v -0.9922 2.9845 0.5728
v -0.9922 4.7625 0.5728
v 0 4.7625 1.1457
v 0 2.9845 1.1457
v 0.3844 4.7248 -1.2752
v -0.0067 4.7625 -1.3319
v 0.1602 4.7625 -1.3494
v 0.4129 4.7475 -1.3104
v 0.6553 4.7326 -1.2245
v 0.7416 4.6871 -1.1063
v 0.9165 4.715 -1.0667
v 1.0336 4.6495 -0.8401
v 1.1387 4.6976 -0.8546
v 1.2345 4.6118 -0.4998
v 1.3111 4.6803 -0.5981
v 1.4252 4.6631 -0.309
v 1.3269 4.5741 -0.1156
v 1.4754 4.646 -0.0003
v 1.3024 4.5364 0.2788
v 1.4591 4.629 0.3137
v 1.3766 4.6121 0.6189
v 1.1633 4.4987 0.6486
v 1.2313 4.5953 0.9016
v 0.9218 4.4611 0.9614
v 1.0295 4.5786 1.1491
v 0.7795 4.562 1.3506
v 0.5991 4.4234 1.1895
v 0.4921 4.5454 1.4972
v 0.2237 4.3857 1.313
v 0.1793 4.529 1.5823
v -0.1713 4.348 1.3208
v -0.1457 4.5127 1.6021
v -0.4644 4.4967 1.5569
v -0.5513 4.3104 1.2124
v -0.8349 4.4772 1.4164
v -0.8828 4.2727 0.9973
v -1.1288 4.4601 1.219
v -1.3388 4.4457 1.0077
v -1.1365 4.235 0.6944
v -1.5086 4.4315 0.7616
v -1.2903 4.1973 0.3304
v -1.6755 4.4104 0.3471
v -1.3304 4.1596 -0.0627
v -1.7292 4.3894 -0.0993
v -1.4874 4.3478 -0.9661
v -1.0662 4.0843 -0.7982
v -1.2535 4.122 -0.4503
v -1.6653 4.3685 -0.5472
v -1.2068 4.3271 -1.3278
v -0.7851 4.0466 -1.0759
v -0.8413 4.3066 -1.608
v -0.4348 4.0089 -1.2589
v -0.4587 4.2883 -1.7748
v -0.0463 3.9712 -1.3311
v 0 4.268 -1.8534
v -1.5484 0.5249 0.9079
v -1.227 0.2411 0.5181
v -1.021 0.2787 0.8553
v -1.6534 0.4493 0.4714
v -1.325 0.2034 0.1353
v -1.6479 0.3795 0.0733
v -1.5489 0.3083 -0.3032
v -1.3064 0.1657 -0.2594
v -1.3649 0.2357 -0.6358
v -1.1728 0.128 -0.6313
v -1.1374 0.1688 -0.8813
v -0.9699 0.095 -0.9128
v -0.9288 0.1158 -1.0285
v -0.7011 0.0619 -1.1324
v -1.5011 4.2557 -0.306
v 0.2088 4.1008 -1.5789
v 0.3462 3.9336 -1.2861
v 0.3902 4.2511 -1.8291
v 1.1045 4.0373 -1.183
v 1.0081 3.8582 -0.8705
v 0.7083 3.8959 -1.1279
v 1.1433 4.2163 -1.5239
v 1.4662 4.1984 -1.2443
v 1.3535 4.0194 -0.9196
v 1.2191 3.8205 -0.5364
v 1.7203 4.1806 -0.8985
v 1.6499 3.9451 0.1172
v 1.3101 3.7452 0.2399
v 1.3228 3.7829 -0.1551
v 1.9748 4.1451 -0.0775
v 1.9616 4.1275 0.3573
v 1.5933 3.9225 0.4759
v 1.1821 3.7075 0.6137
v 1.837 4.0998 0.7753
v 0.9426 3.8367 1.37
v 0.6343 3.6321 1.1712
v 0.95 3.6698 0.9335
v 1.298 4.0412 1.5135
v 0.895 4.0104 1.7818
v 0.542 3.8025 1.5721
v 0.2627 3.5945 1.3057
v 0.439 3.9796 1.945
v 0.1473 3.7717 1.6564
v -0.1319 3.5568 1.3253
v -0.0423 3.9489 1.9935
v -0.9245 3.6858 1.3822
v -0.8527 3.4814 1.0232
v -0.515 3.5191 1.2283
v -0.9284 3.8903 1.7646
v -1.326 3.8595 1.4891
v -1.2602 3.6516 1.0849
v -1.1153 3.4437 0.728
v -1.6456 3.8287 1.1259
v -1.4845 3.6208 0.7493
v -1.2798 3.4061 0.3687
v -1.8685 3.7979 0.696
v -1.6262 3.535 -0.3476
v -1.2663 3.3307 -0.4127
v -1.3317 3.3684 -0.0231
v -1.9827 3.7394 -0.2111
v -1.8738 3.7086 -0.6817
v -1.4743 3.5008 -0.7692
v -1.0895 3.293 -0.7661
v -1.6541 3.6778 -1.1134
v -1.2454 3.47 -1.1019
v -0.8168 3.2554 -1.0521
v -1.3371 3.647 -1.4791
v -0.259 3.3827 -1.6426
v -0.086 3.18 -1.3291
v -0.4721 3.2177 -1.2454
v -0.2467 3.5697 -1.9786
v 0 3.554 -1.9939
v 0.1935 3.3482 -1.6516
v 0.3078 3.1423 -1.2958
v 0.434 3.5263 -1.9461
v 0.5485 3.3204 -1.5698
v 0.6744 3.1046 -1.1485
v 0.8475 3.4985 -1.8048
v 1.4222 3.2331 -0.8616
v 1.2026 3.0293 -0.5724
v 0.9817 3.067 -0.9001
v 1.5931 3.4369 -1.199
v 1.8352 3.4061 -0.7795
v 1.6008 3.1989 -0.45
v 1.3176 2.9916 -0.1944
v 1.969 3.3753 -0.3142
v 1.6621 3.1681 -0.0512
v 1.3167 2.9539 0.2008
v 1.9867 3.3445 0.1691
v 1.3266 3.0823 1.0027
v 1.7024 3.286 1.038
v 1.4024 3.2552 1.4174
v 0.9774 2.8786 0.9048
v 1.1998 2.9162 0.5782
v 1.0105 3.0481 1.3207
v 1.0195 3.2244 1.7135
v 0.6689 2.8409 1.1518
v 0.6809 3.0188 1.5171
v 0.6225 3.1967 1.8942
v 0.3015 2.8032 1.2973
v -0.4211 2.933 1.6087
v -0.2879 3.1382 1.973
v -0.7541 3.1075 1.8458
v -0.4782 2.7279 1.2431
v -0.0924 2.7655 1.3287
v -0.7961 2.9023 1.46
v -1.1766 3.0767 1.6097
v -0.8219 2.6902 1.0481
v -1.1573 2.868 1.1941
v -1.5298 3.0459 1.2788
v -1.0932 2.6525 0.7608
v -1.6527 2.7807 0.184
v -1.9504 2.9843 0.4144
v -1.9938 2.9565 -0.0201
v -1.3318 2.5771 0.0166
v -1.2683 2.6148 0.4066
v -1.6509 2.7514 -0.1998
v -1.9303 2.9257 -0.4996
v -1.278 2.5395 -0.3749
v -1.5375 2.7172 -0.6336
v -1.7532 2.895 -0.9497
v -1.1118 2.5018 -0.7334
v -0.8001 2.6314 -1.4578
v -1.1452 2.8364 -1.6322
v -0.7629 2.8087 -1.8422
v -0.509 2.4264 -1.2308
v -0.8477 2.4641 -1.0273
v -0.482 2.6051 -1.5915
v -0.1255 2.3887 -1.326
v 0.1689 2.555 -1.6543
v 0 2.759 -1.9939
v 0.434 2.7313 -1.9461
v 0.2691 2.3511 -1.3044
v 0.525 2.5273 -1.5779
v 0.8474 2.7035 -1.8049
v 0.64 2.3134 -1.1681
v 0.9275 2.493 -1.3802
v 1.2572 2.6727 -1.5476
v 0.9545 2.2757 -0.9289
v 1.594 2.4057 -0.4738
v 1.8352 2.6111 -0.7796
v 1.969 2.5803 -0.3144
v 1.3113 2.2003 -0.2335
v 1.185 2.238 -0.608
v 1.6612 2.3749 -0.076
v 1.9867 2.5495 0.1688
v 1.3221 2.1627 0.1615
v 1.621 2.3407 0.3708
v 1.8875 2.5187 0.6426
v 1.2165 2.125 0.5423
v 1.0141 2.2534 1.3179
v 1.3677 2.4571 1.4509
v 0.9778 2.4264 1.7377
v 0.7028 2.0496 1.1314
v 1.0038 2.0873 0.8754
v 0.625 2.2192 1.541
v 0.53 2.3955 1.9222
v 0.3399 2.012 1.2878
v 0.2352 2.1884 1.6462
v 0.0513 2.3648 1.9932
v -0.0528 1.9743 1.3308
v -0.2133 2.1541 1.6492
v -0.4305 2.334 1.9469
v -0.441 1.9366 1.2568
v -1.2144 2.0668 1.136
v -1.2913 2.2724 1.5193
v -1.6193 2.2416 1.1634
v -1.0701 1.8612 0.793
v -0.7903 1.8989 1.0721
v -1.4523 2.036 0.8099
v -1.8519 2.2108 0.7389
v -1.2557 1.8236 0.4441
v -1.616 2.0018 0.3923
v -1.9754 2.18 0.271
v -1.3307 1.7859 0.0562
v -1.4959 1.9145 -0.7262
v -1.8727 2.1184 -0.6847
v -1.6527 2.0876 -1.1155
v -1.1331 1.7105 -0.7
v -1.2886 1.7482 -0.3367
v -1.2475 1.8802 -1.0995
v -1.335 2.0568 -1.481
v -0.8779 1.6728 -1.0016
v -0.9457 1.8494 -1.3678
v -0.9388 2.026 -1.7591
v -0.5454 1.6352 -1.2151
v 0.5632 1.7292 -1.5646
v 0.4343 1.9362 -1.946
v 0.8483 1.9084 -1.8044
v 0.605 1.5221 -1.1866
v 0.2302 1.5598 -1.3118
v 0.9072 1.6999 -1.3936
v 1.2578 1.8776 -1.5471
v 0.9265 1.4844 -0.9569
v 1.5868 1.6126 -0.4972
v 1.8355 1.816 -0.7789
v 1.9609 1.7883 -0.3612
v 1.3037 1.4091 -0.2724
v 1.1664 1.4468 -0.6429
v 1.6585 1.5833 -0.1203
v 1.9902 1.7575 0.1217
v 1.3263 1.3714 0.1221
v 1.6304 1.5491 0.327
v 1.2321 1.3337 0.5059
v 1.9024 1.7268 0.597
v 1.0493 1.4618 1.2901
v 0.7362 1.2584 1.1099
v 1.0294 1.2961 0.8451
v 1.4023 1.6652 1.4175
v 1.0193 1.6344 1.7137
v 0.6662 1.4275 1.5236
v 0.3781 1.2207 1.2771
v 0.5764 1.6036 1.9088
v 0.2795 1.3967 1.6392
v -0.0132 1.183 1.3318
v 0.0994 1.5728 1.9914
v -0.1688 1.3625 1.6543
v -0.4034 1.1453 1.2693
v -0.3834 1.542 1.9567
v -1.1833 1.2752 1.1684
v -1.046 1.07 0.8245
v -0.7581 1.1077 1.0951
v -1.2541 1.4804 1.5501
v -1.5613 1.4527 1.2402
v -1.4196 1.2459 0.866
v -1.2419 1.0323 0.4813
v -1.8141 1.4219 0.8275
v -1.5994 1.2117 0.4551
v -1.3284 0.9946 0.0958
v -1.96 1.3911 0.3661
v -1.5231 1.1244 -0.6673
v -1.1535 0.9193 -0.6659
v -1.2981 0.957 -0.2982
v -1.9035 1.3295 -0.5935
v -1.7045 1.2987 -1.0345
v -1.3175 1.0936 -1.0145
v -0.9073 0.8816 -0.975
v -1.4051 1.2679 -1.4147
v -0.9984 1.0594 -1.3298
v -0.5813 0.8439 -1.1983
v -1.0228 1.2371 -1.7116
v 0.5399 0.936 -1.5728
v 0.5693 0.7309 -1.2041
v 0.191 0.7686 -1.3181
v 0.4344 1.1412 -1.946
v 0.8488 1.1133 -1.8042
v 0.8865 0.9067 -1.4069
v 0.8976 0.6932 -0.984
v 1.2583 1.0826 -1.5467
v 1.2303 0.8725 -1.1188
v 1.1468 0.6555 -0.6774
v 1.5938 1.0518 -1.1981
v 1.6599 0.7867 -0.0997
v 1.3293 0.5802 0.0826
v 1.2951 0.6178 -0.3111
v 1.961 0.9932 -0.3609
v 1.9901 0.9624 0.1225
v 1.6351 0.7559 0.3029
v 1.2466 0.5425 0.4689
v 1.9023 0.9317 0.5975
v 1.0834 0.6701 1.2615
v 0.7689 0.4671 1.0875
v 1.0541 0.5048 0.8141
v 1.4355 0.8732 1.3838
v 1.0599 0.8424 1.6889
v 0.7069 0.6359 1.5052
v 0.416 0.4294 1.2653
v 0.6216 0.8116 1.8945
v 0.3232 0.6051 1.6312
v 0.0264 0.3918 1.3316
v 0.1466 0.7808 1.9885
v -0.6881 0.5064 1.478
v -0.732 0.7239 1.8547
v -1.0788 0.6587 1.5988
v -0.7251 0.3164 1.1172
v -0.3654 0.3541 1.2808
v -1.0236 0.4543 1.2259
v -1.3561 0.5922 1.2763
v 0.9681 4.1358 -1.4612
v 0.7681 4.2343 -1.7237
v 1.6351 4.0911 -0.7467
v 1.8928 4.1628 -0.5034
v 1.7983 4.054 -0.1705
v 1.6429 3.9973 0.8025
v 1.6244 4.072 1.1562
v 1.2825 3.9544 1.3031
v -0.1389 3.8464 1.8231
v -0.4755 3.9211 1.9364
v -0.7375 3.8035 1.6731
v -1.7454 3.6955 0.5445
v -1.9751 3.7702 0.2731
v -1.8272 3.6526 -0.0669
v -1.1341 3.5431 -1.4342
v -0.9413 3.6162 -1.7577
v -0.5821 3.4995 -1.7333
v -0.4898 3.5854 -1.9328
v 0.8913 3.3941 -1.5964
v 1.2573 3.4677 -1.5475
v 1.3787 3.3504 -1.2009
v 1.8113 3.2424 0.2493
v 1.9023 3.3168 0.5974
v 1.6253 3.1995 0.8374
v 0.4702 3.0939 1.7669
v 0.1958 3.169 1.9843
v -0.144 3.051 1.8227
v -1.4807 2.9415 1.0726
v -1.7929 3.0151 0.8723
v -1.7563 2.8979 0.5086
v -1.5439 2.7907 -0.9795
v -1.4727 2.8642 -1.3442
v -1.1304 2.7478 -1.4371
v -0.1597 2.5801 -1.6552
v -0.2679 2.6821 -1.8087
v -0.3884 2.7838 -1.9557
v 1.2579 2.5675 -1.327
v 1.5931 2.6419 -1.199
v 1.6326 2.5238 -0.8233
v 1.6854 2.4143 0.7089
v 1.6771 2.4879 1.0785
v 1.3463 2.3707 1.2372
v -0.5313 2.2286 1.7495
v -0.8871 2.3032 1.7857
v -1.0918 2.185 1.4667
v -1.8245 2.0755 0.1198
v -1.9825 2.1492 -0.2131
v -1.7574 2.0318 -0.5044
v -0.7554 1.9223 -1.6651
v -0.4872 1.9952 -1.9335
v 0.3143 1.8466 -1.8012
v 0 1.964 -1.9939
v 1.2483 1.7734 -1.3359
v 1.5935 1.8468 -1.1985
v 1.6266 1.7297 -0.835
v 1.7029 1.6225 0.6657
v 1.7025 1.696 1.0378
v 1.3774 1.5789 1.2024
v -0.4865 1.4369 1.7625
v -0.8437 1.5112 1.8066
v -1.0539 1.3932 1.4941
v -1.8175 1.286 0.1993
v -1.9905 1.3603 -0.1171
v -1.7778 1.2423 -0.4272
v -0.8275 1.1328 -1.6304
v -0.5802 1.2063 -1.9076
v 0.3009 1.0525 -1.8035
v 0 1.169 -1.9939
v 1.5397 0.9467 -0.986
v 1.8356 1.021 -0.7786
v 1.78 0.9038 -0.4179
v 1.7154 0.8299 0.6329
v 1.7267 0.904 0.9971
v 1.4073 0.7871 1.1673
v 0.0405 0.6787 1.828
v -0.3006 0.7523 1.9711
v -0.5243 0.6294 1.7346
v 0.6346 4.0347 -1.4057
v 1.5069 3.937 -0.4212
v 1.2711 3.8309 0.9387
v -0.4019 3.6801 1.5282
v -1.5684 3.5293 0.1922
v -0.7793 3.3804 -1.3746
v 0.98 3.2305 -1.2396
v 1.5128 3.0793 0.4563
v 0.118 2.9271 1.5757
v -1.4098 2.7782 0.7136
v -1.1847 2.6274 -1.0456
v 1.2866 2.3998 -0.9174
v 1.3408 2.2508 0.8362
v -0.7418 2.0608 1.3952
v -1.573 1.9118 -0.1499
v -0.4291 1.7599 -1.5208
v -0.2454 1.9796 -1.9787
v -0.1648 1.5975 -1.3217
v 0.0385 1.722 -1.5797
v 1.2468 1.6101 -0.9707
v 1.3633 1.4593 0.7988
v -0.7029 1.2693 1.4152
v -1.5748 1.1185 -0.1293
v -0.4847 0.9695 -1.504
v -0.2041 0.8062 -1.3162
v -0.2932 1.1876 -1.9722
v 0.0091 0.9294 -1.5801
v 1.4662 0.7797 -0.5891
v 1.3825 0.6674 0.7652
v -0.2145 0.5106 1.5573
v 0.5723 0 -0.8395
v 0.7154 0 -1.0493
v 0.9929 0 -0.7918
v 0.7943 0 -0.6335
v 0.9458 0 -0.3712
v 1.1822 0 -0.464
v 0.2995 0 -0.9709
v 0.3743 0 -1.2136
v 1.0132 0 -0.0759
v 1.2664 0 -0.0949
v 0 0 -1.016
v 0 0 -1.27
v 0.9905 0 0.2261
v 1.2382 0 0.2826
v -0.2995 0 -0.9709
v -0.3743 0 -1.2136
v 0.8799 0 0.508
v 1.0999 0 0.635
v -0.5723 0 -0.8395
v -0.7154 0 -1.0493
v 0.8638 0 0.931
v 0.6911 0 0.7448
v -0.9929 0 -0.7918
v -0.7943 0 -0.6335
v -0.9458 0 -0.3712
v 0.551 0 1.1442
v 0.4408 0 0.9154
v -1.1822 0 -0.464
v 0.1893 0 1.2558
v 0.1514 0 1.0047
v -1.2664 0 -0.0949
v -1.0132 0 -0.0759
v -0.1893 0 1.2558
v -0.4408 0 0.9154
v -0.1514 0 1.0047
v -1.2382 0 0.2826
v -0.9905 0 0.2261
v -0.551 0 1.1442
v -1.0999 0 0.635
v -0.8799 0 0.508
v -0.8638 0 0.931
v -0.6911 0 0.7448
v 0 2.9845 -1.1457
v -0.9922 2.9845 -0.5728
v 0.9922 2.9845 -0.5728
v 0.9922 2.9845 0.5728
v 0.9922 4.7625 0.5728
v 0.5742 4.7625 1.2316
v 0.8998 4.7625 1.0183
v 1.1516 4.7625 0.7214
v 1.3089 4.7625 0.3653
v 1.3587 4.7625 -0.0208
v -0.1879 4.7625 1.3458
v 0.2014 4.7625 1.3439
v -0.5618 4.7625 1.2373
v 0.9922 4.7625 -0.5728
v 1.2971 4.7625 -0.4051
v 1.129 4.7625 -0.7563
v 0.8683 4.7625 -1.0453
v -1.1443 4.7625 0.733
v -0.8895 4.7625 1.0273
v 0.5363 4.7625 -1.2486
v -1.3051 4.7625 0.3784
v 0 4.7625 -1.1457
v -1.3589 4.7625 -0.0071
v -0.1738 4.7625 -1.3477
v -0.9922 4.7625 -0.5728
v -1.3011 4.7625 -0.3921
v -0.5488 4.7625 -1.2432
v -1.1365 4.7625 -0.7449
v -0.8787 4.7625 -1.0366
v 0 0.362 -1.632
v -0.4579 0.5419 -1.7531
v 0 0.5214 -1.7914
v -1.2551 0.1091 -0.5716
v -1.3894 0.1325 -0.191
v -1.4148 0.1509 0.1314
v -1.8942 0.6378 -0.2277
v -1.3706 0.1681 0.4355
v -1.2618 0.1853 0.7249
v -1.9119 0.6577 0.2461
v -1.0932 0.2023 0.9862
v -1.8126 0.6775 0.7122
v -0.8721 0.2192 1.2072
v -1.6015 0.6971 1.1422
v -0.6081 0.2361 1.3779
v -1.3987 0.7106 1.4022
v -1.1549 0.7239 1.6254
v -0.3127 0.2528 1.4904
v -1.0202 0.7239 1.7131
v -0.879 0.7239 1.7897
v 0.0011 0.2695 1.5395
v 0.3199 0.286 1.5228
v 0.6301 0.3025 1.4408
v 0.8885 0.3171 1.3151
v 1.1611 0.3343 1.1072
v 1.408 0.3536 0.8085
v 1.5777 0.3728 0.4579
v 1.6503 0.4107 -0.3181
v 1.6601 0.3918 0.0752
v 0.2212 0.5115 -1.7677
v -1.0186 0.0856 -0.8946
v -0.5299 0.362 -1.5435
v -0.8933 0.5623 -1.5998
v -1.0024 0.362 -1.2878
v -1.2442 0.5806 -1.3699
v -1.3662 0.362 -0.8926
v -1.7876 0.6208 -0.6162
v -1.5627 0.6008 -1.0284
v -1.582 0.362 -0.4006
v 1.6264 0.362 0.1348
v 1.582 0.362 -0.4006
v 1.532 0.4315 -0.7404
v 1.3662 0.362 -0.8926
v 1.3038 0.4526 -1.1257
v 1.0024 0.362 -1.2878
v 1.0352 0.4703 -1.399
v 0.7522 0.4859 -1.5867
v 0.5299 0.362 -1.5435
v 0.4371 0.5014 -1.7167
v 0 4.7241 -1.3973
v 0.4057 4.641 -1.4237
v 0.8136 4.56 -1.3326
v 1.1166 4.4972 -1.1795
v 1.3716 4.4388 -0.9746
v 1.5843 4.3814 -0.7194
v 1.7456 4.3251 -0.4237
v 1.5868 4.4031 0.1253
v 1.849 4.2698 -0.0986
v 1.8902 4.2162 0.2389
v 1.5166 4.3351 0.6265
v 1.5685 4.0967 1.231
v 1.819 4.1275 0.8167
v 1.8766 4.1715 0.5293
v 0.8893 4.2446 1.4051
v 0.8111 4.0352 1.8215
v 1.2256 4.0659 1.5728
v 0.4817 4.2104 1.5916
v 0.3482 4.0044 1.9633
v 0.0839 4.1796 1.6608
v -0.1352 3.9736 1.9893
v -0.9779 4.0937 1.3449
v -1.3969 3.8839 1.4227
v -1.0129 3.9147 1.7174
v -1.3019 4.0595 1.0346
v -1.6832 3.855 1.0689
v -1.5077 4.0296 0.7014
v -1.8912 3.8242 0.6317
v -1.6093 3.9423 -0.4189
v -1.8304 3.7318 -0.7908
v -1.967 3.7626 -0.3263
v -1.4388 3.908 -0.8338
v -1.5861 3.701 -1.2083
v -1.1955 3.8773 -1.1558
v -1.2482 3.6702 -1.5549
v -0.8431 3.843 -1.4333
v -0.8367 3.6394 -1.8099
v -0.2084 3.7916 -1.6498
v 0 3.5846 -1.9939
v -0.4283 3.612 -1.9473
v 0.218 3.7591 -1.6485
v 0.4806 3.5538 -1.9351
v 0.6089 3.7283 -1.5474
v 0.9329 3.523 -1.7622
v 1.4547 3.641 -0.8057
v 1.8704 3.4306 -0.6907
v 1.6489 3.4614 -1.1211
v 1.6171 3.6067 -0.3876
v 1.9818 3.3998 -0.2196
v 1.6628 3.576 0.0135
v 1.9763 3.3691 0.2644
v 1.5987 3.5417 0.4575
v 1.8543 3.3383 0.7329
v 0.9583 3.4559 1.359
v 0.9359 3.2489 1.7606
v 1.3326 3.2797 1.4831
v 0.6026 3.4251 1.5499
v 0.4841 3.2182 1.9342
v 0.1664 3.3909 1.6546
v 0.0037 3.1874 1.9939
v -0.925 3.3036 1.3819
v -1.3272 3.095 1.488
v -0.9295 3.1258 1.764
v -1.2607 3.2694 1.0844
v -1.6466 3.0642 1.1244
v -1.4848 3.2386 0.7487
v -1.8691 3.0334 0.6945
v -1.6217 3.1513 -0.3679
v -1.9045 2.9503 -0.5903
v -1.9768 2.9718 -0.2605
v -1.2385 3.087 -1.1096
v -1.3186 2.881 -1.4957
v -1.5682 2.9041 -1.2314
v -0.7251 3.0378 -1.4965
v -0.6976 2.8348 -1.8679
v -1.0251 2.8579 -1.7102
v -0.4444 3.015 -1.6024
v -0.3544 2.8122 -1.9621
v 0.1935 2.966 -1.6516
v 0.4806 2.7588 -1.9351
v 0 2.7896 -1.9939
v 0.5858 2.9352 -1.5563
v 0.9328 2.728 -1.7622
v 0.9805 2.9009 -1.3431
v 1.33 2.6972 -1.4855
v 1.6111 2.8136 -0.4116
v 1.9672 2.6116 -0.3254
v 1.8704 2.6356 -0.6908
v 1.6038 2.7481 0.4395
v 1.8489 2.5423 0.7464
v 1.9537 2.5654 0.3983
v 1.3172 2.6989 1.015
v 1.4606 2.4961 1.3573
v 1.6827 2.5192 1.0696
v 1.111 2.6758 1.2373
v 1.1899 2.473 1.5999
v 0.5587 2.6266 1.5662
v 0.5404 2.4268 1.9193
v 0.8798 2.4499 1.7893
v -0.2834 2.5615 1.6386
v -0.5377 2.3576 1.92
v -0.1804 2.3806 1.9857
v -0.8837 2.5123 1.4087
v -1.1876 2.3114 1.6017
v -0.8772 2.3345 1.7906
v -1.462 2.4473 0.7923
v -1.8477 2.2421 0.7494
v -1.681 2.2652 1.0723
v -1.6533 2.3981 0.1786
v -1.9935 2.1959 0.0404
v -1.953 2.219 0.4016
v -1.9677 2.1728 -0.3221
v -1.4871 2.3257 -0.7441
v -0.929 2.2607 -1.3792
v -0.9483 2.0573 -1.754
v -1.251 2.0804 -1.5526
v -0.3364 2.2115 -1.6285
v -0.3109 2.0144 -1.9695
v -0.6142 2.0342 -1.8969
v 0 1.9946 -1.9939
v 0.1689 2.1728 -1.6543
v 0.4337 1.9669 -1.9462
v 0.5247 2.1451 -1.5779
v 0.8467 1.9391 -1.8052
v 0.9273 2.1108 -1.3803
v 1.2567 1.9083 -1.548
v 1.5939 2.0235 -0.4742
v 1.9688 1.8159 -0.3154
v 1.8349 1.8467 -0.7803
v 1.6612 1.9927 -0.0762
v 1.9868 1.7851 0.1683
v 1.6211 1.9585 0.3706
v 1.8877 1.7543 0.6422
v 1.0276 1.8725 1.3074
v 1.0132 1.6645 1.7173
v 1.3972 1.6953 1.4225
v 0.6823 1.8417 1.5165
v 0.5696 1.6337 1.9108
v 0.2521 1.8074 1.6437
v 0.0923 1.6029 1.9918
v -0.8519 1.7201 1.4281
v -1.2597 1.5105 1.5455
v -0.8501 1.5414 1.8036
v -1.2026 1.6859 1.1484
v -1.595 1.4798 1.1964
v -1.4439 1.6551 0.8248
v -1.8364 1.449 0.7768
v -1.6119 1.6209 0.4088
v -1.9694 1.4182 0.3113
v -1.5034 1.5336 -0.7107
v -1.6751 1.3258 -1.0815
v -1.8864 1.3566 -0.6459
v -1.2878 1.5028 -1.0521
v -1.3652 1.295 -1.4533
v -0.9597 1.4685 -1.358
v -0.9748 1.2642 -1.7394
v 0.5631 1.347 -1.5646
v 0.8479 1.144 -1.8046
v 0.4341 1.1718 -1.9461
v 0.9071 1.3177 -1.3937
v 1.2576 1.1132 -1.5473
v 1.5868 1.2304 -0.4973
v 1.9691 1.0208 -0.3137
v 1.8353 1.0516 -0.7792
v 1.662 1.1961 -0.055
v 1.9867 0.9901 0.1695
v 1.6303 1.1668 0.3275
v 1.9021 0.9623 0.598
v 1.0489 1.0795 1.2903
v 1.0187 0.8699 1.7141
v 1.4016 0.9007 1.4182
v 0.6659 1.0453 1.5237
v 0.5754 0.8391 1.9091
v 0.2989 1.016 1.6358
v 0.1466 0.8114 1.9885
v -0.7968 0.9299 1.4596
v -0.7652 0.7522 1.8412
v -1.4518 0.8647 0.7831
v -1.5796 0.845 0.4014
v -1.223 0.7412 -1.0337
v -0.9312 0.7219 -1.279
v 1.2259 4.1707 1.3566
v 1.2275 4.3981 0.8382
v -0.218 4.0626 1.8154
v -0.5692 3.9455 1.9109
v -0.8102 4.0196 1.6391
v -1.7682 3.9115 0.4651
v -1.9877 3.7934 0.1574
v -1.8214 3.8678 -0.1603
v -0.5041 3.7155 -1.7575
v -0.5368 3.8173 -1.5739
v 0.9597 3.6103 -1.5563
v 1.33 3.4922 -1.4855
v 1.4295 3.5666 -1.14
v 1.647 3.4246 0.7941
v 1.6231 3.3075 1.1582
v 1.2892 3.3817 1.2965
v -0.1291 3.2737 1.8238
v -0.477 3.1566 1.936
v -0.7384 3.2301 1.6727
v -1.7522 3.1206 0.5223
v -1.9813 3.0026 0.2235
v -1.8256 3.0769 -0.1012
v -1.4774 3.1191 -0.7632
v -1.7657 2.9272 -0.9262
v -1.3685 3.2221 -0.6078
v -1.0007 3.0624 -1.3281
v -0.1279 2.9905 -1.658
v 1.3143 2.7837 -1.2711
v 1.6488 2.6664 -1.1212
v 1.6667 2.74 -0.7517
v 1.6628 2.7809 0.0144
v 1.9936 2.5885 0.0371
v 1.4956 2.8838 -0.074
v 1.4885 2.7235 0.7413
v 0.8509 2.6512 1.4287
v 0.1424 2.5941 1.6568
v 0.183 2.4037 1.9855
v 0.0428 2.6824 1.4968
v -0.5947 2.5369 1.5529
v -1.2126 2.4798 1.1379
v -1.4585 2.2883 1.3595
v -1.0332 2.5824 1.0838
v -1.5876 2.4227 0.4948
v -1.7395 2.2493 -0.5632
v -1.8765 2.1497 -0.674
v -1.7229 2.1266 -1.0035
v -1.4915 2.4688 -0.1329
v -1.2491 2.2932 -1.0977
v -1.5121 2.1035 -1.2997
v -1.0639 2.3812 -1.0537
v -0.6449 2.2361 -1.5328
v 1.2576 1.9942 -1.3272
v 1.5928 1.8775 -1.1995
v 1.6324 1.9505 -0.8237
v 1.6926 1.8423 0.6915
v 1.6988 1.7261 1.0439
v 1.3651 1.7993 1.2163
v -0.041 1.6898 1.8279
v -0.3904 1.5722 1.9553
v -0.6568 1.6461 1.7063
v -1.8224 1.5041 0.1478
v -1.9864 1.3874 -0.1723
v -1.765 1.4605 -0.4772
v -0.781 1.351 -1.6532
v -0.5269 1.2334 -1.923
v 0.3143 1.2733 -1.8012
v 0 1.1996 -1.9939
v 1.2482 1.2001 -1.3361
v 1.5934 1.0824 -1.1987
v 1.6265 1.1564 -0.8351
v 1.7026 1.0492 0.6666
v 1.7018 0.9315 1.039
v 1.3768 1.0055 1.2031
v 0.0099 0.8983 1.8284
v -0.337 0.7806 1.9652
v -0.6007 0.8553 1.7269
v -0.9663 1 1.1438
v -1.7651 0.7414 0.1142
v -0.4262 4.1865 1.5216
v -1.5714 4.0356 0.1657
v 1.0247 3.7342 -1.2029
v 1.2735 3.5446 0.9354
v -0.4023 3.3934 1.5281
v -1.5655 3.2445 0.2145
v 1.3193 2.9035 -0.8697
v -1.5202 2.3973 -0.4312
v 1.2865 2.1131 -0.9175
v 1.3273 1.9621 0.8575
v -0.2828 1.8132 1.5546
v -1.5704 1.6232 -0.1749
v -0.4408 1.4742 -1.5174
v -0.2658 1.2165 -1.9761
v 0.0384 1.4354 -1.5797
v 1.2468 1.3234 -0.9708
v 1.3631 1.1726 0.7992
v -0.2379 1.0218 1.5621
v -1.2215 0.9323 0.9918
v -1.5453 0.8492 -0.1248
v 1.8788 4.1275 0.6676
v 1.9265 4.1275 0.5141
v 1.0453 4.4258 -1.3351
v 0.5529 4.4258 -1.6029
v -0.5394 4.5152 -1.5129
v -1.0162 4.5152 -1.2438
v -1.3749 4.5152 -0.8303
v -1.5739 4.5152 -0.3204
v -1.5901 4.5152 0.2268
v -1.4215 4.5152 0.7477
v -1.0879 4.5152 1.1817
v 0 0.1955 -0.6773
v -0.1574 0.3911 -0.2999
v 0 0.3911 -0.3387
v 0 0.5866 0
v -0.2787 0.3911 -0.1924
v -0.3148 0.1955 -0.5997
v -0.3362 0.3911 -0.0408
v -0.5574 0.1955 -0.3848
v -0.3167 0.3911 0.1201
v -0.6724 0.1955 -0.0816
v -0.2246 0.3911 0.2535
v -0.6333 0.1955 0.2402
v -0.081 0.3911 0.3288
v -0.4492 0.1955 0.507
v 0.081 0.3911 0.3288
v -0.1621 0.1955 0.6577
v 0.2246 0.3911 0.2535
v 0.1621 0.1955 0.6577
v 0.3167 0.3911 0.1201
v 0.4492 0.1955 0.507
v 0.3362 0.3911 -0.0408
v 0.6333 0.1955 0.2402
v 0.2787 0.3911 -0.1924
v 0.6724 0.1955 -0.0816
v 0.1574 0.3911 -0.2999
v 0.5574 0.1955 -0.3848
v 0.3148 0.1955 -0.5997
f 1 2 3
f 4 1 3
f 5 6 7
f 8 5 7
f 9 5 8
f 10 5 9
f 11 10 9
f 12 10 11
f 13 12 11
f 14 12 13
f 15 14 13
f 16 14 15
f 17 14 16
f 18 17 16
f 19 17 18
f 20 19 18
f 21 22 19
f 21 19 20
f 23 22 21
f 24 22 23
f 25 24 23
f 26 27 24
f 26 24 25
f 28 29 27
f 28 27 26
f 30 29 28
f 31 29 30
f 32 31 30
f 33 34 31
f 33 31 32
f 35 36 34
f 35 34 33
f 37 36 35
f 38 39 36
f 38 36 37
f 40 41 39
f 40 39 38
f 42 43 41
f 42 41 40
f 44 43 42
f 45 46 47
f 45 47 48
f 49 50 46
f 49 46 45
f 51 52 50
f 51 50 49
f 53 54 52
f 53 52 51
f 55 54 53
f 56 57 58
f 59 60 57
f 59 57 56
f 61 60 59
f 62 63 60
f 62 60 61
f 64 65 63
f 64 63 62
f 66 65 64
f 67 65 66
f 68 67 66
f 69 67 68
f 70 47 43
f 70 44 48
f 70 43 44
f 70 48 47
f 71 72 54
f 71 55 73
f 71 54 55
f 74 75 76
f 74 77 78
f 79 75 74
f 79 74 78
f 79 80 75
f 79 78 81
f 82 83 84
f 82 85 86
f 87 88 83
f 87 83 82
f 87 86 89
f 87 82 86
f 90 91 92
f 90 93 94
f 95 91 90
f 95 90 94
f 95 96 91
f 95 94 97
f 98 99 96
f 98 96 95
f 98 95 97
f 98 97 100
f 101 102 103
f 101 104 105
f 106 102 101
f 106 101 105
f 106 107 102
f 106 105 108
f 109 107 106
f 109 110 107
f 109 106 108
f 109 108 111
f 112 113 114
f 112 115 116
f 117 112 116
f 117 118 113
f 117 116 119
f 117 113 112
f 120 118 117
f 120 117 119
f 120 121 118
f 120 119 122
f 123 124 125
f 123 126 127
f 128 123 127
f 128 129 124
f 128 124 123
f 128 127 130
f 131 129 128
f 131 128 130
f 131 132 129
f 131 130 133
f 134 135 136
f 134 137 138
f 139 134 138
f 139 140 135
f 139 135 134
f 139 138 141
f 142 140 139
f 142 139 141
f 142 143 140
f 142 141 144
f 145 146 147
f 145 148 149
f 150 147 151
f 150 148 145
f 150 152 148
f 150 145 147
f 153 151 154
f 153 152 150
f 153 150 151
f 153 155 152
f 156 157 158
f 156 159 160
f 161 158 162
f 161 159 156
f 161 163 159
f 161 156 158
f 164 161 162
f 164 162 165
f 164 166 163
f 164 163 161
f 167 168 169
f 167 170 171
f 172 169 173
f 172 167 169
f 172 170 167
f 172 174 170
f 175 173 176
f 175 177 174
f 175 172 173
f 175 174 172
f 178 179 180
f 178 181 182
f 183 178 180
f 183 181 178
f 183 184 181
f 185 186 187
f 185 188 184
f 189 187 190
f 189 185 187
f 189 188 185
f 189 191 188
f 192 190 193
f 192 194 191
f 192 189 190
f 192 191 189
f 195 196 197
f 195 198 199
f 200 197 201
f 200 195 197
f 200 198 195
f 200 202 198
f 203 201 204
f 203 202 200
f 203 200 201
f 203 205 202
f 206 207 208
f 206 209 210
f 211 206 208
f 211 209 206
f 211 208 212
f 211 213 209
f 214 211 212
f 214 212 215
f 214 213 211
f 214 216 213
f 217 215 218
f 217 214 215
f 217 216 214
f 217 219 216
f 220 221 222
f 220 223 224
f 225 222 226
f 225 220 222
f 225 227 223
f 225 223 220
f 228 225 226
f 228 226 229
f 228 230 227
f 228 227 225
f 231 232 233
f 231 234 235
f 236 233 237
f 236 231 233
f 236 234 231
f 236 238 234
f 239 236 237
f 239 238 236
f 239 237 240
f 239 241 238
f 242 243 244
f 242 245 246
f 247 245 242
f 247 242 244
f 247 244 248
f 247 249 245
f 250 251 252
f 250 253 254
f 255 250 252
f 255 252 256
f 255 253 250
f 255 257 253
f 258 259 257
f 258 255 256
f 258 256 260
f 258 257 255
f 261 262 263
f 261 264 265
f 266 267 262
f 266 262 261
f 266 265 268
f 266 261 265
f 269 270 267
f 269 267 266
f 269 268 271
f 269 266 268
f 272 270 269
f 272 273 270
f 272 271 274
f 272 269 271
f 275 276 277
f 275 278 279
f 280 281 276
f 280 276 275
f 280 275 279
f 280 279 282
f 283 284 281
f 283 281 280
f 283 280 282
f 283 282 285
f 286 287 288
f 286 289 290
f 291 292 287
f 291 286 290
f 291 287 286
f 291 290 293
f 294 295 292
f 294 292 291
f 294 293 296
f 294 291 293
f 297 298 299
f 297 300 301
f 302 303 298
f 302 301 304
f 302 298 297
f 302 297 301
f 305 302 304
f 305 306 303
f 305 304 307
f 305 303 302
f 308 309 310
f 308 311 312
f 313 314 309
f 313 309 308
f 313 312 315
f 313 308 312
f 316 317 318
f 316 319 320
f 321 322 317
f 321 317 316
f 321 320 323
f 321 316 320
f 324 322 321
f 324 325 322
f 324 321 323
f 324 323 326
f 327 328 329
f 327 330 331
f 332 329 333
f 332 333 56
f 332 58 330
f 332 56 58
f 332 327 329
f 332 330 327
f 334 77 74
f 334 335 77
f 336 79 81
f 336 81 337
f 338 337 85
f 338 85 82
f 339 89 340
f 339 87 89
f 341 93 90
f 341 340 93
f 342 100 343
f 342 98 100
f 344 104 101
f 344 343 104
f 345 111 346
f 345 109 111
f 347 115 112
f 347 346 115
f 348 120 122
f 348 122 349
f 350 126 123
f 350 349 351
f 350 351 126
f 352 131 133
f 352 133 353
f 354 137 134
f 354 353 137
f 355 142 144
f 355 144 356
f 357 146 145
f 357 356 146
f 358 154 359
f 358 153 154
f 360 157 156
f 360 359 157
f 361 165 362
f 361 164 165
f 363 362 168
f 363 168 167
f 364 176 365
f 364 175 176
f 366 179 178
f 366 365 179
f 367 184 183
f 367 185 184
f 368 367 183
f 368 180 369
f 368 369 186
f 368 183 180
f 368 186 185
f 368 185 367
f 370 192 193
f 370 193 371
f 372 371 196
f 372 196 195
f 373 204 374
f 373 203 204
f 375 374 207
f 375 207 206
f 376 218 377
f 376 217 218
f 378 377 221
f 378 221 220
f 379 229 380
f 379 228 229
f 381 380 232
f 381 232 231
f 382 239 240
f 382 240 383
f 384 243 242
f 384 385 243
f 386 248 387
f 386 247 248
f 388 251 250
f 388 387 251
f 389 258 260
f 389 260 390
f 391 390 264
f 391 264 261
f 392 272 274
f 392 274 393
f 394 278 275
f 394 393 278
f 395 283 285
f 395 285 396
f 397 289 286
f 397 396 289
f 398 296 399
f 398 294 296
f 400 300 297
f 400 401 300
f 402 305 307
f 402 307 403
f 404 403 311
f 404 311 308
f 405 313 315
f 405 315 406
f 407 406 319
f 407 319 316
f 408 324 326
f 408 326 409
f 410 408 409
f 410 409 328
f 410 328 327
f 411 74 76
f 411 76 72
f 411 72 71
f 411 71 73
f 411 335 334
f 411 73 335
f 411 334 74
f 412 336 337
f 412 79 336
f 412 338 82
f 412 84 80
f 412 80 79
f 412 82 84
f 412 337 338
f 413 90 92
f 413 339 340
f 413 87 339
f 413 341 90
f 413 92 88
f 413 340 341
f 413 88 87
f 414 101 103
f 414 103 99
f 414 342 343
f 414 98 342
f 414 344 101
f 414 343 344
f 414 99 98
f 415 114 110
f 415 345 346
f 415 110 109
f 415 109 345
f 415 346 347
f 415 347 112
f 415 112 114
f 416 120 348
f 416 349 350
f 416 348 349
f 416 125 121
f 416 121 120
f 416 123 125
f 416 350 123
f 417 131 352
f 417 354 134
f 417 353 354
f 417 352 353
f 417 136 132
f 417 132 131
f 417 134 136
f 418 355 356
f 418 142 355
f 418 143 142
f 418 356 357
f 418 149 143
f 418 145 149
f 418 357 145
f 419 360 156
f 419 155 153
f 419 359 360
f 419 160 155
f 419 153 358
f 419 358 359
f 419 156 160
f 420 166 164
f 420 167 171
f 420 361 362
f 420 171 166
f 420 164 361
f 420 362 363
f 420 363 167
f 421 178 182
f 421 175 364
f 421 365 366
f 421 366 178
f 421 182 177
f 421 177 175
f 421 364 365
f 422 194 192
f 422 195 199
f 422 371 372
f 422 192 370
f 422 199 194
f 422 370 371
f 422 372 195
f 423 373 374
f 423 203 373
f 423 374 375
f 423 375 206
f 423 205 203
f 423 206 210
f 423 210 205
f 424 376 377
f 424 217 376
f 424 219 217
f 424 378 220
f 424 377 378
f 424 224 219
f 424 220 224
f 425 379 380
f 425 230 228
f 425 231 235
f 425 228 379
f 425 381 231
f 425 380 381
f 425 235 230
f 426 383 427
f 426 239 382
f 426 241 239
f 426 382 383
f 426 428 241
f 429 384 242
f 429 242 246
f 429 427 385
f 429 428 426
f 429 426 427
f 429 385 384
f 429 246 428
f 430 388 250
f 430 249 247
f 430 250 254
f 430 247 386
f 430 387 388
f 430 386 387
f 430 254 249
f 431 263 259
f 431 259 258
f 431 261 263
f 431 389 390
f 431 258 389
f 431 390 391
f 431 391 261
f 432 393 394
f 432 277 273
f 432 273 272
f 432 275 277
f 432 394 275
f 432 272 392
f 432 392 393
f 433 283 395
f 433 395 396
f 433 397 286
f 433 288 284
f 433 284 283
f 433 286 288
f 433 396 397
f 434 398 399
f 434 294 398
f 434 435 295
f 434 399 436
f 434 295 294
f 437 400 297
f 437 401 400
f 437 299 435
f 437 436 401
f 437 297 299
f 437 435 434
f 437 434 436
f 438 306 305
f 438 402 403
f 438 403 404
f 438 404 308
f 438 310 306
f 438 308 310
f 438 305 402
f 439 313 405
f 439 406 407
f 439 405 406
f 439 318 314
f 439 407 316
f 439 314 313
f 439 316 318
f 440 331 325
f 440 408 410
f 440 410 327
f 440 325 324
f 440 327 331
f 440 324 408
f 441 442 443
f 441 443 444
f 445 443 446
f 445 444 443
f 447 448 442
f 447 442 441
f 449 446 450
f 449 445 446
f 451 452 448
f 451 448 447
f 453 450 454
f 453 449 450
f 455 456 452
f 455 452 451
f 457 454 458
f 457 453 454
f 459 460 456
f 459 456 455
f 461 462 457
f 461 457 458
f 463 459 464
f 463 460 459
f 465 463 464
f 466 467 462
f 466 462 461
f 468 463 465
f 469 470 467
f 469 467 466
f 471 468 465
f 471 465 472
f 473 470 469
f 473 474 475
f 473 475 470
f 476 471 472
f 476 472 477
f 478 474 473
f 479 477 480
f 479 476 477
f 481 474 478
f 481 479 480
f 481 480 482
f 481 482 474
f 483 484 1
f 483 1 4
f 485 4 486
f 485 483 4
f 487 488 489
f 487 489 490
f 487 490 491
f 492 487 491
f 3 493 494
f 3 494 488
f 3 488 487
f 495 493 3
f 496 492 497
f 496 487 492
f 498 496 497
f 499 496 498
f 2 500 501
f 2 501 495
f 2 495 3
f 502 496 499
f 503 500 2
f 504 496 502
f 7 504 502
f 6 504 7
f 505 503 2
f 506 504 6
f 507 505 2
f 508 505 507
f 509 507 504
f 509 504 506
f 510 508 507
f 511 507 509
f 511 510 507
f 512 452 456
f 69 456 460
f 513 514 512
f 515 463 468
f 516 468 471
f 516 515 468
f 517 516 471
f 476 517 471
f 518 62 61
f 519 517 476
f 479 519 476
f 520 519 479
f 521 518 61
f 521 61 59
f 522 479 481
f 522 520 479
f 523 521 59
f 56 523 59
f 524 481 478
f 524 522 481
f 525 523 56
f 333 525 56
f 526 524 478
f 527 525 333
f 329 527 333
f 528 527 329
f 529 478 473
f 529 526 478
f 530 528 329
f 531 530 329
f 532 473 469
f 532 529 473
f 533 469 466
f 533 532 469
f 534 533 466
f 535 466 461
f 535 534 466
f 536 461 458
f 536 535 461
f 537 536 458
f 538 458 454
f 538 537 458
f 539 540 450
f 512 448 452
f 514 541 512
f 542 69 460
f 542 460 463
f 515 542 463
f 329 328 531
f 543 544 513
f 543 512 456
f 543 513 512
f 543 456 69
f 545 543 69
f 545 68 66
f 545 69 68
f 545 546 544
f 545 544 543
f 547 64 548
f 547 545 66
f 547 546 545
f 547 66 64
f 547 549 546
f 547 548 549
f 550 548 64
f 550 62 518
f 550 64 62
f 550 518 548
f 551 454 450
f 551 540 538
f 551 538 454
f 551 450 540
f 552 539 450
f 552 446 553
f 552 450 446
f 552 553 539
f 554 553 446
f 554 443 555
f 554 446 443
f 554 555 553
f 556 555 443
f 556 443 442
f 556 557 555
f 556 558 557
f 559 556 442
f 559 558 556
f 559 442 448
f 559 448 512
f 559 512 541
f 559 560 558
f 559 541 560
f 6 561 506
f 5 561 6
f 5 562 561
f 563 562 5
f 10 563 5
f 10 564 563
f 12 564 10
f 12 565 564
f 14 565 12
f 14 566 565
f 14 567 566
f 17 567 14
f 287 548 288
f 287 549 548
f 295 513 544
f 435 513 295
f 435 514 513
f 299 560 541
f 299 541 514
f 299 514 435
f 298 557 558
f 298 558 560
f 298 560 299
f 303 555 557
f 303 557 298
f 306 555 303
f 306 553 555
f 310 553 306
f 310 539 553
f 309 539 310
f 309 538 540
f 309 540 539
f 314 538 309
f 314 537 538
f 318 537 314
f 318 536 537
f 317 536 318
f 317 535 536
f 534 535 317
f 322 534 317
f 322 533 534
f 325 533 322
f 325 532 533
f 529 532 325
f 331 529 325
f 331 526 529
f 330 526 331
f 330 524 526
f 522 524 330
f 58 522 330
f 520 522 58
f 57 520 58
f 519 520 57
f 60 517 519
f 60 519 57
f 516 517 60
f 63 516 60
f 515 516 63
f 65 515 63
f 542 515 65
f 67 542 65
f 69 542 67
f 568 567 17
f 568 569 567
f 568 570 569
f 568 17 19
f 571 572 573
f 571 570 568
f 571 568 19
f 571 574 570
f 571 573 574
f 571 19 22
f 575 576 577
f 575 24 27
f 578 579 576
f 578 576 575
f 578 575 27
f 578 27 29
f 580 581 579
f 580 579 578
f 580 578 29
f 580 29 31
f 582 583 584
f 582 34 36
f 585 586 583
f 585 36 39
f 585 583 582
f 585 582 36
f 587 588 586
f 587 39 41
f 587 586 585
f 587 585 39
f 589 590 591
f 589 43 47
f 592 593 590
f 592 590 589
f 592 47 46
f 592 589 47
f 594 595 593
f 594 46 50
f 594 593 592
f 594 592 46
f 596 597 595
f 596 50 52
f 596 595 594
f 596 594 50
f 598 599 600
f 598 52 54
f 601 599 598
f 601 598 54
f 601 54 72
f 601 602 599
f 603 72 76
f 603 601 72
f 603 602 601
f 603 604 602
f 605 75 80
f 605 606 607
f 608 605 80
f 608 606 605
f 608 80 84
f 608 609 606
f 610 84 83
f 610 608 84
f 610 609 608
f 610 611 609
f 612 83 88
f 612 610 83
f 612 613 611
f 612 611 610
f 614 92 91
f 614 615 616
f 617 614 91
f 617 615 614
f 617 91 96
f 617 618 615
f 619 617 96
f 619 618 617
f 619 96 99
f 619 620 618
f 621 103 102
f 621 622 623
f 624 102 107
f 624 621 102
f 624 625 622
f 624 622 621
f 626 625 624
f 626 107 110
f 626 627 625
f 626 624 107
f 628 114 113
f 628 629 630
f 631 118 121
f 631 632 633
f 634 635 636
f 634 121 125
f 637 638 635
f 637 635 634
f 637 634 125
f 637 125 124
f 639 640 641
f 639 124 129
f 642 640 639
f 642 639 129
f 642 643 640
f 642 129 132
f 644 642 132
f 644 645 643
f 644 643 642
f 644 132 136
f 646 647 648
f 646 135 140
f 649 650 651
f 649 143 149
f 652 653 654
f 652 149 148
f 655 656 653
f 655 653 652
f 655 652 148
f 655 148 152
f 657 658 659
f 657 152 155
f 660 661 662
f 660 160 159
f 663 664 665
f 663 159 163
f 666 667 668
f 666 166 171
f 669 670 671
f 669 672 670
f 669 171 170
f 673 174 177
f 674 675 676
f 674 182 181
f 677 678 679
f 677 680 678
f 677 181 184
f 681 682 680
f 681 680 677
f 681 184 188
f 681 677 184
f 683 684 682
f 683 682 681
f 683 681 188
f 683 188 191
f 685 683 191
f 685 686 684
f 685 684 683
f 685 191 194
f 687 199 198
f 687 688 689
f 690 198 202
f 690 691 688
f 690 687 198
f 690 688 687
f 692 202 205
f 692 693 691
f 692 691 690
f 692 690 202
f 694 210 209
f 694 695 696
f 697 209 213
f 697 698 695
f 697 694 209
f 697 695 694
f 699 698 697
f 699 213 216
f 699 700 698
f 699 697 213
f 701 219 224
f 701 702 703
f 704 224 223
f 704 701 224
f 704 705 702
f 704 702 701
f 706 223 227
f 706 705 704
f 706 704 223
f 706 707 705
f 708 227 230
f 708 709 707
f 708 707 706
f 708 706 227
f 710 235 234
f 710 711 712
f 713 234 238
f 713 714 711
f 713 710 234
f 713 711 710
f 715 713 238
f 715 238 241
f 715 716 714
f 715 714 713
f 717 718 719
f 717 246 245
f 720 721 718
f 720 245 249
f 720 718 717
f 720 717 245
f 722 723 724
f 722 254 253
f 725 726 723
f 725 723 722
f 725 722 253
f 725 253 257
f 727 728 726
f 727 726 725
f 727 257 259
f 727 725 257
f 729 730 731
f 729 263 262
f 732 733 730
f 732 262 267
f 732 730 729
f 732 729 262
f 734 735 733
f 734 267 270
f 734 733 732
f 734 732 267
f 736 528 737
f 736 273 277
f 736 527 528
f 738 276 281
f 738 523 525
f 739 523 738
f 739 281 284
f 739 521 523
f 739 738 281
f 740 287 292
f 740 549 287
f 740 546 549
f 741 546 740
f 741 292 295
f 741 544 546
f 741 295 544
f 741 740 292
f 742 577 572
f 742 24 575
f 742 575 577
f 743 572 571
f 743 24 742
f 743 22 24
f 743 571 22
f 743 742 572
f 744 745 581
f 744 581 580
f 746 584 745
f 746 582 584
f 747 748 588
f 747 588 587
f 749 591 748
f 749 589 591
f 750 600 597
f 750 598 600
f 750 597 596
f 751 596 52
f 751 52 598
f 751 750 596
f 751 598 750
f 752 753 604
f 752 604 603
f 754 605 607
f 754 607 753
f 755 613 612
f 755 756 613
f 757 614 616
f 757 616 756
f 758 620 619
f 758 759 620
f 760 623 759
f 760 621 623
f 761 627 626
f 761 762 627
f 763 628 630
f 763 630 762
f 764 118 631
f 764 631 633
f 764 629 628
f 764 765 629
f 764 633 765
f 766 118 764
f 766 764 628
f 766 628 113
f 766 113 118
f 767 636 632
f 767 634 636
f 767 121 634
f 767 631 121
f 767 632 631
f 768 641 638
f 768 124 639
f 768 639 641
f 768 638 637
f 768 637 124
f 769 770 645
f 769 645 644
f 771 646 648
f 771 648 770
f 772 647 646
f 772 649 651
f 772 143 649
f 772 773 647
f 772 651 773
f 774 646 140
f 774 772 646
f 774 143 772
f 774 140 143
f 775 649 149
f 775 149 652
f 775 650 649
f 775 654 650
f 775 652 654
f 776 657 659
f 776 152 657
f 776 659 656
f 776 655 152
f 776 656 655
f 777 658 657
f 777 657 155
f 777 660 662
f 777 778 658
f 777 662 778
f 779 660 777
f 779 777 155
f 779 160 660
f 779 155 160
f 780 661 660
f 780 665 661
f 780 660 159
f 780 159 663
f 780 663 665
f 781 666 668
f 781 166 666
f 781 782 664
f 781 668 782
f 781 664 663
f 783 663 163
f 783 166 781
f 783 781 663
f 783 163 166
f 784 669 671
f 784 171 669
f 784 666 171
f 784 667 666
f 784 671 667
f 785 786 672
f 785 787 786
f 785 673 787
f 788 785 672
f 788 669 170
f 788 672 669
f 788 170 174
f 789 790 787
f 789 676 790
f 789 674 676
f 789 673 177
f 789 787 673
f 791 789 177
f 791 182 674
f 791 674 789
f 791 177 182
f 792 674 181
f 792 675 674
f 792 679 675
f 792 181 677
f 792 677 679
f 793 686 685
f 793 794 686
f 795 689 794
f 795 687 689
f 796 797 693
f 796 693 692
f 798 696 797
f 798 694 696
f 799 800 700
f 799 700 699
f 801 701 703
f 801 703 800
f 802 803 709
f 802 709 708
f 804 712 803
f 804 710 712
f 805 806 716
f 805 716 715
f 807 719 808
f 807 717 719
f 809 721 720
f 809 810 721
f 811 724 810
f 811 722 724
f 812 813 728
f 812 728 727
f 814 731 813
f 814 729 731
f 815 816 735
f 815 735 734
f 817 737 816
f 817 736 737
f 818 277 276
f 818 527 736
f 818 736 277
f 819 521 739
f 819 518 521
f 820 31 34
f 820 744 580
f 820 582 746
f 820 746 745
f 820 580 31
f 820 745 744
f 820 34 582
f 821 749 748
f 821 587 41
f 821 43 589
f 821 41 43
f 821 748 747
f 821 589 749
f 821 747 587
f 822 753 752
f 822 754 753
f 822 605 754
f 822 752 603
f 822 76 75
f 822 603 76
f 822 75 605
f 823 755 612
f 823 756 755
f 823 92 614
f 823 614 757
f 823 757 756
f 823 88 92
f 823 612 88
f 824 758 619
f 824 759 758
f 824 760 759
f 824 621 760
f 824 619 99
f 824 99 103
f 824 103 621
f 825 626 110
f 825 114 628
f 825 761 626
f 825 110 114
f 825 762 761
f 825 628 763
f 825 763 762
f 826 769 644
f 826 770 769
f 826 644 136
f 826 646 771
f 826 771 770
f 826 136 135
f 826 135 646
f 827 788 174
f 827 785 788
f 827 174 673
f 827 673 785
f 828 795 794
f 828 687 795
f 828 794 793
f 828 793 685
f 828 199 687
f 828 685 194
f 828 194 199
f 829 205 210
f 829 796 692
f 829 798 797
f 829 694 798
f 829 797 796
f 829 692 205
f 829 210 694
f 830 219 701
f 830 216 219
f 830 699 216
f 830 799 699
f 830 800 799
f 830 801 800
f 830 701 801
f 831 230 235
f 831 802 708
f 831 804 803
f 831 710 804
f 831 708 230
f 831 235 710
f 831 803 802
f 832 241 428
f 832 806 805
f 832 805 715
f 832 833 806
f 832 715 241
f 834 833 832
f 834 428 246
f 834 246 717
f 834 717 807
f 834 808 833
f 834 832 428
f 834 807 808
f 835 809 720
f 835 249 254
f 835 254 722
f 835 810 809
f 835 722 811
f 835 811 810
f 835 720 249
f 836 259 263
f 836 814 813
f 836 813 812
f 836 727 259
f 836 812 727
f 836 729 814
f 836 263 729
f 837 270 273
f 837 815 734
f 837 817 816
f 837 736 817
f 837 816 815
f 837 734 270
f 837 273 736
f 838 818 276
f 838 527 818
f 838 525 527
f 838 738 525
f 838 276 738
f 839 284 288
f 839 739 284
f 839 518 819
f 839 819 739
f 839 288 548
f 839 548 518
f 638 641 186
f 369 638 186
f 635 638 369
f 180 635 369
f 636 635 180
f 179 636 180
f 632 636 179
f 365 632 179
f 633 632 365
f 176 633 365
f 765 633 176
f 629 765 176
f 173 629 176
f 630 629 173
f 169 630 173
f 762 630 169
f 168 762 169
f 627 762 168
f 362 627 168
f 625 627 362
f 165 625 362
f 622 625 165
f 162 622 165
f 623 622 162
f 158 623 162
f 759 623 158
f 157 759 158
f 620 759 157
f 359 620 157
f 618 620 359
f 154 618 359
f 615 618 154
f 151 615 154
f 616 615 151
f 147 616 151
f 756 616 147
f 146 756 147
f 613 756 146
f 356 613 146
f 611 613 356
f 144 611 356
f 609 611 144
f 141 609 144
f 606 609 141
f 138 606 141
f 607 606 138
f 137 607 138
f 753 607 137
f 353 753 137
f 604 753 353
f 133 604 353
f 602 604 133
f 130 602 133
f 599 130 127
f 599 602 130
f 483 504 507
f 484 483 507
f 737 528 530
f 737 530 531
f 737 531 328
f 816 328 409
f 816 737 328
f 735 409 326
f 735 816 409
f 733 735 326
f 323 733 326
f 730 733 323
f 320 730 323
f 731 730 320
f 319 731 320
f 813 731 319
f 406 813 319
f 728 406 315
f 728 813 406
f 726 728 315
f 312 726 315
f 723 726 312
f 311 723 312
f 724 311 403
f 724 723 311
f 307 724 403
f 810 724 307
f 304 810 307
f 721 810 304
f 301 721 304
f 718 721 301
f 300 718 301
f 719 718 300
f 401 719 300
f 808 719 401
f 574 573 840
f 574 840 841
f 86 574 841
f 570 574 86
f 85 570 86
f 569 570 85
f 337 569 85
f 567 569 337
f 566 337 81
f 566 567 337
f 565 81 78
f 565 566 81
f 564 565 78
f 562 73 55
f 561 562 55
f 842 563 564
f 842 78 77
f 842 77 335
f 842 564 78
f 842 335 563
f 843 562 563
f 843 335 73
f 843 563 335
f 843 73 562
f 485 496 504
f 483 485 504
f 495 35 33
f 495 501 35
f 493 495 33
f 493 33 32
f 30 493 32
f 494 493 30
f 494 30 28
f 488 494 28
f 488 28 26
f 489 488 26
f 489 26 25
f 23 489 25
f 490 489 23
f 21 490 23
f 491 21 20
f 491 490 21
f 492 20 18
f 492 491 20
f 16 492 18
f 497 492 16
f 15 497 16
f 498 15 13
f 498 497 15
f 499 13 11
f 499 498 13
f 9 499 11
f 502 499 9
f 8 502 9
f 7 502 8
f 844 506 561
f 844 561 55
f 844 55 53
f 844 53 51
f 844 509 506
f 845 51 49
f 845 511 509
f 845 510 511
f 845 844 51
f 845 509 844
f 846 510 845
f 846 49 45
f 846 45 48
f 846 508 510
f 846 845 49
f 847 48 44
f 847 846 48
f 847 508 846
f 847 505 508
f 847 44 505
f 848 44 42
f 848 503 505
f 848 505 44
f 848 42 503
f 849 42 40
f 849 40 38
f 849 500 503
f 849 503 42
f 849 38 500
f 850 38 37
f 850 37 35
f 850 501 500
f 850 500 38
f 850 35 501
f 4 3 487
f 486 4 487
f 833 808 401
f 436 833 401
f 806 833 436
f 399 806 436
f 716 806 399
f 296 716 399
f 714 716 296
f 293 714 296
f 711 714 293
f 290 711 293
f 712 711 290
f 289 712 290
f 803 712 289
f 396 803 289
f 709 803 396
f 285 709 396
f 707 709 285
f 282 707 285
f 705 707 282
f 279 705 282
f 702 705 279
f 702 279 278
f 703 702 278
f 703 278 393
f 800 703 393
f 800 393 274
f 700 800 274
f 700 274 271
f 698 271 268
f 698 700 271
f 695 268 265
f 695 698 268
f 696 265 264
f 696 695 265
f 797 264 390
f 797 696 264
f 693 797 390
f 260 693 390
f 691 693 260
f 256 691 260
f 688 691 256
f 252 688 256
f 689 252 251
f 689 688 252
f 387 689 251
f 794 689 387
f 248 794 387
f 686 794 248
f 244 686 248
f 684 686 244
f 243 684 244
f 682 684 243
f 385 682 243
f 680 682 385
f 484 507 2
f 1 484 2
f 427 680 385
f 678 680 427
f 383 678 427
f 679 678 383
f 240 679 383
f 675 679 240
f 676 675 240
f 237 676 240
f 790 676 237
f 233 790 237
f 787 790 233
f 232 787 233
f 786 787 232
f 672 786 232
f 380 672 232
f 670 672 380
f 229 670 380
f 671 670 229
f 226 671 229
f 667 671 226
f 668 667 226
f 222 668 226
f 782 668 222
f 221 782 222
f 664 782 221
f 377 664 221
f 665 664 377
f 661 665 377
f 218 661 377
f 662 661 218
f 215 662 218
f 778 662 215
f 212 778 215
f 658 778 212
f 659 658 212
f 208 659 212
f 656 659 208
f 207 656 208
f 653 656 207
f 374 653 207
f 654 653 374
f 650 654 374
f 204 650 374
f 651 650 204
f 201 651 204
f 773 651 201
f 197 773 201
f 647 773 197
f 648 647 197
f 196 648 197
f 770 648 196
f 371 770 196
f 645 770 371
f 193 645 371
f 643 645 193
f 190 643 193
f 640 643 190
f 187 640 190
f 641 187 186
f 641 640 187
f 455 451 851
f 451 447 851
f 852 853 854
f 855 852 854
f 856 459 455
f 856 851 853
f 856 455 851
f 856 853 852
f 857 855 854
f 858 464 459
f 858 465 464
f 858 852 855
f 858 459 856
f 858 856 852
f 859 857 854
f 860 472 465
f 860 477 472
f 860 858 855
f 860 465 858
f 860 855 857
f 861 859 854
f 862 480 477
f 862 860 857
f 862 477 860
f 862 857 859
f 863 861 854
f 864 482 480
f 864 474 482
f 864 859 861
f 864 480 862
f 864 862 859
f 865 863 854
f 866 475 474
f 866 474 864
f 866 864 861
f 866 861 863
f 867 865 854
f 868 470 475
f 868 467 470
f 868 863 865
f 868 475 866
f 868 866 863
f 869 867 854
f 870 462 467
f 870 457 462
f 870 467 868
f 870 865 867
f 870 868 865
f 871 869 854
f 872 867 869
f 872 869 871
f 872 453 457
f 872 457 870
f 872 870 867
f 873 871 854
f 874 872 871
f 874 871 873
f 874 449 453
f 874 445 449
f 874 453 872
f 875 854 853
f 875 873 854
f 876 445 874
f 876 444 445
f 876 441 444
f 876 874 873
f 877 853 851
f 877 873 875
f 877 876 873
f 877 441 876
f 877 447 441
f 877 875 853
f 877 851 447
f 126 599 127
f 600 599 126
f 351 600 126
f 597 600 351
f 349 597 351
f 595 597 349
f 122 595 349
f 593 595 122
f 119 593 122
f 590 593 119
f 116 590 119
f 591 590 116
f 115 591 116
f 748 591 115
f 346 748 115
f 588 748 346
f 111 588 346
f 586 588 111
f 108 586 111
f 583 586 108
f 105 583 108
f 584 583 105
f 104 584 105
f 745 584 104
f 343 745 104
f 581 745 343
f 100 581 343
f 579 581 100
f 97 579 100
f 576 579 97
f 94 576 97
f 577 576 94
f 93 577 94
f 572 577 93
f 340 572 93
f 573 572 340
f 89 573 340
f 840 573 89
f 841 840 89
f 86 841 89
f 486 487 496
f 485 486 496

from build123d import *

# Parameters (mm, degrees)
CUT_EXTRUDE1_DEPTH     = 1.778
CUT_SWEEP3_PITCH       = 0.79502
CUT_SWEEP3_HEIGHT      = 9.525
CUT_SWEEP3_RADIUS      = 1.9939
CUT_SWEEP3_START_ANGLE = -180


with BuildPart() as part:
    # Sketch1 → Revolve1 (revolve)
    with BuildSketch(Plane.XY, mode=Mode.PRIVATE) as revolve1_sk:
        Polygon((0, 0.586587873), (-1.016, 0), (-1.27, 0), (-1.9939, 0.7239), (-1.9939, 4.1275), (-1.3589, 4.7625), (0, 4.7625), align=None)
    revolve(revolve1_sk.sketch.rotate(Axis((0, 0, 0), (0, 1, 0)), 270), axis=Axis((0, 0, 0), (0, 1, 0)))

    # Sketch2 → Cut-Extrude1 (cut)
    with BuildSketch(Plane(origin=(0, 4.7625, 0), x_dir=(1, 0, 0), z_dir=(0, 1, 0))):
        Polygon((0, 1.14567944), (-0.9921875, 0.57283972), (-0.9921875, -0.57283972), (0, -1.14567944), (0.9921875, -0.57283972), (0.9921875, 0.57283972), align=None)
    extrude(amount=-CUT_EXTRUDE1_DEPTH, mode=Mode.SUBTRACT)

    # Cut-Sweep3: sweep along a helix
    with BuildLine() as cut_sweep3_path:
        add(Helix(CUT_SWEEP3_PITCH, CUT_SWEEP3_HEIGHT, CUT_SWEEP3_RADIUS, center=(0, 4.7625, 0), direction=(0, -1, 0), mode=Mode.PRIVATE).rotate(Axis((0, 4.7625, 0), (0, -1, 0)), CUT_SWEEP3_START_ANGLE))
    # Sketch4 → Cut-Sweep3 (sweep, cut)
    with BuildSketch(Plane(origin=(0, 0, 0), x_dir=(0, 0, -1), z_dir=(1, 0, 0))):
        Polygon((-2.0193, 5.55625), (-2.0193, 4.7625), (-1.331892336, 5.159375), align=None)
    sweep(path=cut_sweep3_path.line, is_frenet=True, mode=Mode.SUBTRACT)


solid = part.part
